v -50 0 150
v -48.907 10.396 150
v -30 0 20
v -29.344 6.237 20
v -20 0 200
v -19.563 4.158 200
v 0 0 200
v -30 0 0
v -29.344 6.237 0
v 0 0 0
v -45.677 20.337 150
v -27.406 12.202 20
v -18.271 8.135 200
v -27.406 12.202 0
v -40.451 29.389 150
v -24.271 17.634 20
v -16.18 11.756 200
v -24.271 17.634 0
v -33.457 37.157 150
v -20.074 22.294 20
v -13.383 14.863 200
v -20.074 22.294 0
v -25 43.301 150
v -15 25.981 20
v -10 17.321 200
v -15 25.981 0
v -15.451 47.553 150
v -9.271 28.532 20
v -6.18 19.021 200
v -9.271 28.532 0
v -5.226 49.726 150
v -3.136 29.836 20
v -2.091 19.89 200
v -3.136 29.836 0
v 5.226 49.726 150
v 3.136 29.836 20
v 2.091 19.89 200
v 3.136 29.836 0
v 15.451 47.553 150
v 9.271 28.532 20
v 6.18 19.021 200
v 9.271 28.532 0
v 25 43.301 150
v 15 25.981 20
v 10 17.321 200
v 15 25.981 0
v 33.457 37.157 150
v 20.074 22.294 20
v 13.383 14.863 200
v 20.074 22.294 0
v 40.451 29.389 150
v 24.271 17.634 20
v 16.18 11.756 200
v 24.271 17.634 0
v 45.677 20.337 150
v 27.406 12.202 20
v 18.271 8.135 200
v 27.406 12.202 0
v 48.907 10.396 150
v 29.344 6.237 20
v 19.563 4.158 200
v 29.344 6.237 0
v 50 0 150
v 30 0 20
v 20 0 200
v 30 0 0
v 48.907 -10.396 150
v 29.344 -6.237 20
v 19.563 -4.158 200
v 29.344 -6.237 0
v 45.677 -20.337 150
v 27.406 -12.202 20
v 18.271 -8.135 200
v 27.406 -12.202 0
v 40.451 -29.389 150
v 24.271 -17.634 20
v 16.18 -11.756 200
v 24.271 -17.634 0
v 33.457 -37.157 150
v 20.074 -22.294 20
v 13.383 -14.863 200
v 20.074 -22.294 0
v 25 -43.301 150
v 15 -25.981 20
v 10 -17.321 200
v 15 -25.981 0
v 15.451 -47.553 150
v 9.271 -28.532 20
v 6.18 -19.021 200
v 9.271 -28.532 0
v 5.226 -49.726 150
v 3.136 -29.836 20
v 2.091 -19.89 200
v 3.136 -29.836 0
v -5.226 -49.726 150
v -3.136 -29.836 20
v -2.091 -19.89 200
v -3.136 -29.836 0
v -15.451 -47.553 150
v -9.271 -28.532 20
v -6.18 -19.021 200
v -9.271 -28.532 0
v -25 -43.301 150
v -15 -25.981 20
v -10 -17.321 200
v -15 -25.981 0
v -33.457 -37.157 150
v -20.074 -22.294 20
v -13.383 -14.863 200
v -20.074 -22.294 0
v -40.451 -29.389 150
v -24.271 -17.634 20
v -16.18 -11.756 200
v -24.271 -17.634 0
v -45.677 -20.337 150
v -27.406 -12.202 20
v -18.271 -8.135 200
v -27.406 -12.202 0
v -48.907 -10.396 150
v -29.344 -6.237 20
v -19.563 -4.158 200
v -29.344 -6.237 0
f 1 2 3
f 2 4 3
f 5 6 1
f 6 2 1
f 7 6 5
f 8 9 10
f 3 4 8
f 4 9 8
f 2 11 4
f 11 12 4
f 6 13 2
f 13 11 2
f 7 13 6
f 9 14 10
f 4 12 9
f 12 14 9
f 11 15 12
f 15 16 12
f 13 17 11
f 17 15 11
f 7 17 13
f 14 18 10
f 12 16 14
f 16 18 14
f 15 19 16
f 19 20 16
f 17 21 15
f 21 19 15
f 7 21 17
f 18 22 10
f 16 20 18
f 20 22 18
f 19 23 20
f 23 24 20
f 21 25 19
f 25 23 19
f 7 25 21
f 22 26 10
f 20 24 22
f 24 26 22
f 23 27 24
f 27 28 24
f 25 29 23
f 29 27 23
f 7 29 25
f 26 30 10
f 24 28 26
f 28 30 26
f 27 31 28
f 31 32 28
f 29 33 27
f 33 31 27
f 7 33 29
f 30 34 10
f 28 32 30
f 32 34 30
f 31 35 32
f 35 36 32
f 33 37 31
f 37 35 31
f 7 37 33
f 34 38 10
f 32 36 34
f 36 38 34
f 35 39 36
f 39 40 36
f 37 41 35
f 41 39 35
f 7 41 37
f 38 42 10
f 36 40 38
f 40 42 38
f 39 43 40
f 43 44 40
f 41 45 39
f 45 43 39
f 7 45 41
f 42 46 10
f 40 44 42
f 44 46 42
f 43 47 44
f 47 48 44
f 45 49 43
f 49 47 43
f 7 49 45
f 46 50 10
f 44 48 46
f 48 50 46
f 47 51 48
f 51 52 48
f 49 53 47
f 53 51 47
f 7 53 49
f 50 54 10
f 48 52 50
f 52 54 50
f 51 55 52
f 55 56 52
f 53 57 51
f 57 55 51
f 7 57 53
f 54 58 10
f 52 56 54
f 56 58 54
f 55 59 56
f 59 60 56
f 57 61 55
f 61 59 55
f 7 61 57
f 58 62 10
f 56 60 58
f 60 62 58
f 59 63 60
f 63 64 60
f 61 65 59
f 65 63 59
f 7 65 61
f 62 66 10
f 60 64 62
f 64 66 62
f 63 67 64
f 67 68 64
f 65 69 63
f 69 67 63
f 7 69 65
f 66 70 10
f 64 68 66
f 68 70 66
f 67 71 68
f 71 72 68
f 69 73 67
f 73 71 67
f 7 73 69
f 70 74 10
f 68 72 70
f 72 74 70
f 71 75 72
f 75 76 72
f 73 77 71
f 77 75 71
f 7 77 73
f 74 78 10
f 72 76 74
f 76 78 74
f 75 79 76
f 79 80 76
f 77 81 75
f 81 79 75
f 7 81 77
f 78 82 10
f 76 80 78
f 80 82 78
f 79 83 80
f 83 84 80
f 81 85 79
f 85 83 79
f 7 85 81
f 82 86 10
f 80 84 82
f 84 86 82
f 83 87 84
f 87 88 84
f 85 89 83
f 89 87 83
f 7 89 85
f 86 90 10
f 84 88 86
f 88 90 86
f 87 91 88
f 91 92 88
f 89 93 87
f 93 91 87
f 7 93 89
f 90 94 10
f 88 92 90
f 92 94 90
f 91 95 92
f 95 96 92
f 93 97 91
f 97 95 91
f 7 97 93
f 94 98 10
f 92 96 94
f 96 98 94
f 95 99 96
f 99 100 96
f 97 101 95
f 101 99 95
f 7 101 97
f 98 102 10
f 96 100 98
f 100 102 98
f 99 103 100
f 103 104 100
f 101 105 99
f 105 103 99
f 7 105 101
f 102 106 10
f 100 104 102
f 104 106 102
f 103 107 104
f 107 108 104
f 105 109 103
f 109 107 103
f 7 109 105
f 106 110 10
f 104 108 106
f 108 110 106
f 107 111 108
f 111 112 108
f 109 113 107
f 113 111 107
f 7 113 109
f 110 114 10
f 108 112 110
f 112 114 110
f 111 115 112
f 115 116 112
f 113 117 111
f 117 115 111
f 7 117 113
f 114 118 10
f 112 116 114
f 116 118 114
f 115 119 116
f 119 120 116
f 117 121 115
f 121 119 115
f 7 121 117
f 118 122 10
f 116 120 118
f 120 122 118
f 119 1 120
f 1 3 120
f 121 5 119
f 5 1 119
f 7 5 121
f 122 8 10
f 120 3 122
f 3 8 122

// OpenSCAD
// Parameters for vase dimensions
vase_height = 200;
vase_width = 100;
neck_height = 50;
neck_width = 40;
base_height = 20;
base_width = 60;

// Function to define the profile of the vase
module vase_profile() {
    // Define the shape using a series of points
    polyline = [
        [0, 0], // Bottom of vase
        [base_width / 2, 0],
        [base_width / 2, base_height], // Base transition
        [vase_width / 2, vase_height - neck_height], // Main body
        [neck_width / 2, vase_height], // Neck
        [0, vase_height] // Top center
    ];
    
    // Create the profile for rotation
    polygon(points = polyline);
}

// Create the 3D vase by rotating the profile
rotate_extrude() {
    vase_profile();
}
